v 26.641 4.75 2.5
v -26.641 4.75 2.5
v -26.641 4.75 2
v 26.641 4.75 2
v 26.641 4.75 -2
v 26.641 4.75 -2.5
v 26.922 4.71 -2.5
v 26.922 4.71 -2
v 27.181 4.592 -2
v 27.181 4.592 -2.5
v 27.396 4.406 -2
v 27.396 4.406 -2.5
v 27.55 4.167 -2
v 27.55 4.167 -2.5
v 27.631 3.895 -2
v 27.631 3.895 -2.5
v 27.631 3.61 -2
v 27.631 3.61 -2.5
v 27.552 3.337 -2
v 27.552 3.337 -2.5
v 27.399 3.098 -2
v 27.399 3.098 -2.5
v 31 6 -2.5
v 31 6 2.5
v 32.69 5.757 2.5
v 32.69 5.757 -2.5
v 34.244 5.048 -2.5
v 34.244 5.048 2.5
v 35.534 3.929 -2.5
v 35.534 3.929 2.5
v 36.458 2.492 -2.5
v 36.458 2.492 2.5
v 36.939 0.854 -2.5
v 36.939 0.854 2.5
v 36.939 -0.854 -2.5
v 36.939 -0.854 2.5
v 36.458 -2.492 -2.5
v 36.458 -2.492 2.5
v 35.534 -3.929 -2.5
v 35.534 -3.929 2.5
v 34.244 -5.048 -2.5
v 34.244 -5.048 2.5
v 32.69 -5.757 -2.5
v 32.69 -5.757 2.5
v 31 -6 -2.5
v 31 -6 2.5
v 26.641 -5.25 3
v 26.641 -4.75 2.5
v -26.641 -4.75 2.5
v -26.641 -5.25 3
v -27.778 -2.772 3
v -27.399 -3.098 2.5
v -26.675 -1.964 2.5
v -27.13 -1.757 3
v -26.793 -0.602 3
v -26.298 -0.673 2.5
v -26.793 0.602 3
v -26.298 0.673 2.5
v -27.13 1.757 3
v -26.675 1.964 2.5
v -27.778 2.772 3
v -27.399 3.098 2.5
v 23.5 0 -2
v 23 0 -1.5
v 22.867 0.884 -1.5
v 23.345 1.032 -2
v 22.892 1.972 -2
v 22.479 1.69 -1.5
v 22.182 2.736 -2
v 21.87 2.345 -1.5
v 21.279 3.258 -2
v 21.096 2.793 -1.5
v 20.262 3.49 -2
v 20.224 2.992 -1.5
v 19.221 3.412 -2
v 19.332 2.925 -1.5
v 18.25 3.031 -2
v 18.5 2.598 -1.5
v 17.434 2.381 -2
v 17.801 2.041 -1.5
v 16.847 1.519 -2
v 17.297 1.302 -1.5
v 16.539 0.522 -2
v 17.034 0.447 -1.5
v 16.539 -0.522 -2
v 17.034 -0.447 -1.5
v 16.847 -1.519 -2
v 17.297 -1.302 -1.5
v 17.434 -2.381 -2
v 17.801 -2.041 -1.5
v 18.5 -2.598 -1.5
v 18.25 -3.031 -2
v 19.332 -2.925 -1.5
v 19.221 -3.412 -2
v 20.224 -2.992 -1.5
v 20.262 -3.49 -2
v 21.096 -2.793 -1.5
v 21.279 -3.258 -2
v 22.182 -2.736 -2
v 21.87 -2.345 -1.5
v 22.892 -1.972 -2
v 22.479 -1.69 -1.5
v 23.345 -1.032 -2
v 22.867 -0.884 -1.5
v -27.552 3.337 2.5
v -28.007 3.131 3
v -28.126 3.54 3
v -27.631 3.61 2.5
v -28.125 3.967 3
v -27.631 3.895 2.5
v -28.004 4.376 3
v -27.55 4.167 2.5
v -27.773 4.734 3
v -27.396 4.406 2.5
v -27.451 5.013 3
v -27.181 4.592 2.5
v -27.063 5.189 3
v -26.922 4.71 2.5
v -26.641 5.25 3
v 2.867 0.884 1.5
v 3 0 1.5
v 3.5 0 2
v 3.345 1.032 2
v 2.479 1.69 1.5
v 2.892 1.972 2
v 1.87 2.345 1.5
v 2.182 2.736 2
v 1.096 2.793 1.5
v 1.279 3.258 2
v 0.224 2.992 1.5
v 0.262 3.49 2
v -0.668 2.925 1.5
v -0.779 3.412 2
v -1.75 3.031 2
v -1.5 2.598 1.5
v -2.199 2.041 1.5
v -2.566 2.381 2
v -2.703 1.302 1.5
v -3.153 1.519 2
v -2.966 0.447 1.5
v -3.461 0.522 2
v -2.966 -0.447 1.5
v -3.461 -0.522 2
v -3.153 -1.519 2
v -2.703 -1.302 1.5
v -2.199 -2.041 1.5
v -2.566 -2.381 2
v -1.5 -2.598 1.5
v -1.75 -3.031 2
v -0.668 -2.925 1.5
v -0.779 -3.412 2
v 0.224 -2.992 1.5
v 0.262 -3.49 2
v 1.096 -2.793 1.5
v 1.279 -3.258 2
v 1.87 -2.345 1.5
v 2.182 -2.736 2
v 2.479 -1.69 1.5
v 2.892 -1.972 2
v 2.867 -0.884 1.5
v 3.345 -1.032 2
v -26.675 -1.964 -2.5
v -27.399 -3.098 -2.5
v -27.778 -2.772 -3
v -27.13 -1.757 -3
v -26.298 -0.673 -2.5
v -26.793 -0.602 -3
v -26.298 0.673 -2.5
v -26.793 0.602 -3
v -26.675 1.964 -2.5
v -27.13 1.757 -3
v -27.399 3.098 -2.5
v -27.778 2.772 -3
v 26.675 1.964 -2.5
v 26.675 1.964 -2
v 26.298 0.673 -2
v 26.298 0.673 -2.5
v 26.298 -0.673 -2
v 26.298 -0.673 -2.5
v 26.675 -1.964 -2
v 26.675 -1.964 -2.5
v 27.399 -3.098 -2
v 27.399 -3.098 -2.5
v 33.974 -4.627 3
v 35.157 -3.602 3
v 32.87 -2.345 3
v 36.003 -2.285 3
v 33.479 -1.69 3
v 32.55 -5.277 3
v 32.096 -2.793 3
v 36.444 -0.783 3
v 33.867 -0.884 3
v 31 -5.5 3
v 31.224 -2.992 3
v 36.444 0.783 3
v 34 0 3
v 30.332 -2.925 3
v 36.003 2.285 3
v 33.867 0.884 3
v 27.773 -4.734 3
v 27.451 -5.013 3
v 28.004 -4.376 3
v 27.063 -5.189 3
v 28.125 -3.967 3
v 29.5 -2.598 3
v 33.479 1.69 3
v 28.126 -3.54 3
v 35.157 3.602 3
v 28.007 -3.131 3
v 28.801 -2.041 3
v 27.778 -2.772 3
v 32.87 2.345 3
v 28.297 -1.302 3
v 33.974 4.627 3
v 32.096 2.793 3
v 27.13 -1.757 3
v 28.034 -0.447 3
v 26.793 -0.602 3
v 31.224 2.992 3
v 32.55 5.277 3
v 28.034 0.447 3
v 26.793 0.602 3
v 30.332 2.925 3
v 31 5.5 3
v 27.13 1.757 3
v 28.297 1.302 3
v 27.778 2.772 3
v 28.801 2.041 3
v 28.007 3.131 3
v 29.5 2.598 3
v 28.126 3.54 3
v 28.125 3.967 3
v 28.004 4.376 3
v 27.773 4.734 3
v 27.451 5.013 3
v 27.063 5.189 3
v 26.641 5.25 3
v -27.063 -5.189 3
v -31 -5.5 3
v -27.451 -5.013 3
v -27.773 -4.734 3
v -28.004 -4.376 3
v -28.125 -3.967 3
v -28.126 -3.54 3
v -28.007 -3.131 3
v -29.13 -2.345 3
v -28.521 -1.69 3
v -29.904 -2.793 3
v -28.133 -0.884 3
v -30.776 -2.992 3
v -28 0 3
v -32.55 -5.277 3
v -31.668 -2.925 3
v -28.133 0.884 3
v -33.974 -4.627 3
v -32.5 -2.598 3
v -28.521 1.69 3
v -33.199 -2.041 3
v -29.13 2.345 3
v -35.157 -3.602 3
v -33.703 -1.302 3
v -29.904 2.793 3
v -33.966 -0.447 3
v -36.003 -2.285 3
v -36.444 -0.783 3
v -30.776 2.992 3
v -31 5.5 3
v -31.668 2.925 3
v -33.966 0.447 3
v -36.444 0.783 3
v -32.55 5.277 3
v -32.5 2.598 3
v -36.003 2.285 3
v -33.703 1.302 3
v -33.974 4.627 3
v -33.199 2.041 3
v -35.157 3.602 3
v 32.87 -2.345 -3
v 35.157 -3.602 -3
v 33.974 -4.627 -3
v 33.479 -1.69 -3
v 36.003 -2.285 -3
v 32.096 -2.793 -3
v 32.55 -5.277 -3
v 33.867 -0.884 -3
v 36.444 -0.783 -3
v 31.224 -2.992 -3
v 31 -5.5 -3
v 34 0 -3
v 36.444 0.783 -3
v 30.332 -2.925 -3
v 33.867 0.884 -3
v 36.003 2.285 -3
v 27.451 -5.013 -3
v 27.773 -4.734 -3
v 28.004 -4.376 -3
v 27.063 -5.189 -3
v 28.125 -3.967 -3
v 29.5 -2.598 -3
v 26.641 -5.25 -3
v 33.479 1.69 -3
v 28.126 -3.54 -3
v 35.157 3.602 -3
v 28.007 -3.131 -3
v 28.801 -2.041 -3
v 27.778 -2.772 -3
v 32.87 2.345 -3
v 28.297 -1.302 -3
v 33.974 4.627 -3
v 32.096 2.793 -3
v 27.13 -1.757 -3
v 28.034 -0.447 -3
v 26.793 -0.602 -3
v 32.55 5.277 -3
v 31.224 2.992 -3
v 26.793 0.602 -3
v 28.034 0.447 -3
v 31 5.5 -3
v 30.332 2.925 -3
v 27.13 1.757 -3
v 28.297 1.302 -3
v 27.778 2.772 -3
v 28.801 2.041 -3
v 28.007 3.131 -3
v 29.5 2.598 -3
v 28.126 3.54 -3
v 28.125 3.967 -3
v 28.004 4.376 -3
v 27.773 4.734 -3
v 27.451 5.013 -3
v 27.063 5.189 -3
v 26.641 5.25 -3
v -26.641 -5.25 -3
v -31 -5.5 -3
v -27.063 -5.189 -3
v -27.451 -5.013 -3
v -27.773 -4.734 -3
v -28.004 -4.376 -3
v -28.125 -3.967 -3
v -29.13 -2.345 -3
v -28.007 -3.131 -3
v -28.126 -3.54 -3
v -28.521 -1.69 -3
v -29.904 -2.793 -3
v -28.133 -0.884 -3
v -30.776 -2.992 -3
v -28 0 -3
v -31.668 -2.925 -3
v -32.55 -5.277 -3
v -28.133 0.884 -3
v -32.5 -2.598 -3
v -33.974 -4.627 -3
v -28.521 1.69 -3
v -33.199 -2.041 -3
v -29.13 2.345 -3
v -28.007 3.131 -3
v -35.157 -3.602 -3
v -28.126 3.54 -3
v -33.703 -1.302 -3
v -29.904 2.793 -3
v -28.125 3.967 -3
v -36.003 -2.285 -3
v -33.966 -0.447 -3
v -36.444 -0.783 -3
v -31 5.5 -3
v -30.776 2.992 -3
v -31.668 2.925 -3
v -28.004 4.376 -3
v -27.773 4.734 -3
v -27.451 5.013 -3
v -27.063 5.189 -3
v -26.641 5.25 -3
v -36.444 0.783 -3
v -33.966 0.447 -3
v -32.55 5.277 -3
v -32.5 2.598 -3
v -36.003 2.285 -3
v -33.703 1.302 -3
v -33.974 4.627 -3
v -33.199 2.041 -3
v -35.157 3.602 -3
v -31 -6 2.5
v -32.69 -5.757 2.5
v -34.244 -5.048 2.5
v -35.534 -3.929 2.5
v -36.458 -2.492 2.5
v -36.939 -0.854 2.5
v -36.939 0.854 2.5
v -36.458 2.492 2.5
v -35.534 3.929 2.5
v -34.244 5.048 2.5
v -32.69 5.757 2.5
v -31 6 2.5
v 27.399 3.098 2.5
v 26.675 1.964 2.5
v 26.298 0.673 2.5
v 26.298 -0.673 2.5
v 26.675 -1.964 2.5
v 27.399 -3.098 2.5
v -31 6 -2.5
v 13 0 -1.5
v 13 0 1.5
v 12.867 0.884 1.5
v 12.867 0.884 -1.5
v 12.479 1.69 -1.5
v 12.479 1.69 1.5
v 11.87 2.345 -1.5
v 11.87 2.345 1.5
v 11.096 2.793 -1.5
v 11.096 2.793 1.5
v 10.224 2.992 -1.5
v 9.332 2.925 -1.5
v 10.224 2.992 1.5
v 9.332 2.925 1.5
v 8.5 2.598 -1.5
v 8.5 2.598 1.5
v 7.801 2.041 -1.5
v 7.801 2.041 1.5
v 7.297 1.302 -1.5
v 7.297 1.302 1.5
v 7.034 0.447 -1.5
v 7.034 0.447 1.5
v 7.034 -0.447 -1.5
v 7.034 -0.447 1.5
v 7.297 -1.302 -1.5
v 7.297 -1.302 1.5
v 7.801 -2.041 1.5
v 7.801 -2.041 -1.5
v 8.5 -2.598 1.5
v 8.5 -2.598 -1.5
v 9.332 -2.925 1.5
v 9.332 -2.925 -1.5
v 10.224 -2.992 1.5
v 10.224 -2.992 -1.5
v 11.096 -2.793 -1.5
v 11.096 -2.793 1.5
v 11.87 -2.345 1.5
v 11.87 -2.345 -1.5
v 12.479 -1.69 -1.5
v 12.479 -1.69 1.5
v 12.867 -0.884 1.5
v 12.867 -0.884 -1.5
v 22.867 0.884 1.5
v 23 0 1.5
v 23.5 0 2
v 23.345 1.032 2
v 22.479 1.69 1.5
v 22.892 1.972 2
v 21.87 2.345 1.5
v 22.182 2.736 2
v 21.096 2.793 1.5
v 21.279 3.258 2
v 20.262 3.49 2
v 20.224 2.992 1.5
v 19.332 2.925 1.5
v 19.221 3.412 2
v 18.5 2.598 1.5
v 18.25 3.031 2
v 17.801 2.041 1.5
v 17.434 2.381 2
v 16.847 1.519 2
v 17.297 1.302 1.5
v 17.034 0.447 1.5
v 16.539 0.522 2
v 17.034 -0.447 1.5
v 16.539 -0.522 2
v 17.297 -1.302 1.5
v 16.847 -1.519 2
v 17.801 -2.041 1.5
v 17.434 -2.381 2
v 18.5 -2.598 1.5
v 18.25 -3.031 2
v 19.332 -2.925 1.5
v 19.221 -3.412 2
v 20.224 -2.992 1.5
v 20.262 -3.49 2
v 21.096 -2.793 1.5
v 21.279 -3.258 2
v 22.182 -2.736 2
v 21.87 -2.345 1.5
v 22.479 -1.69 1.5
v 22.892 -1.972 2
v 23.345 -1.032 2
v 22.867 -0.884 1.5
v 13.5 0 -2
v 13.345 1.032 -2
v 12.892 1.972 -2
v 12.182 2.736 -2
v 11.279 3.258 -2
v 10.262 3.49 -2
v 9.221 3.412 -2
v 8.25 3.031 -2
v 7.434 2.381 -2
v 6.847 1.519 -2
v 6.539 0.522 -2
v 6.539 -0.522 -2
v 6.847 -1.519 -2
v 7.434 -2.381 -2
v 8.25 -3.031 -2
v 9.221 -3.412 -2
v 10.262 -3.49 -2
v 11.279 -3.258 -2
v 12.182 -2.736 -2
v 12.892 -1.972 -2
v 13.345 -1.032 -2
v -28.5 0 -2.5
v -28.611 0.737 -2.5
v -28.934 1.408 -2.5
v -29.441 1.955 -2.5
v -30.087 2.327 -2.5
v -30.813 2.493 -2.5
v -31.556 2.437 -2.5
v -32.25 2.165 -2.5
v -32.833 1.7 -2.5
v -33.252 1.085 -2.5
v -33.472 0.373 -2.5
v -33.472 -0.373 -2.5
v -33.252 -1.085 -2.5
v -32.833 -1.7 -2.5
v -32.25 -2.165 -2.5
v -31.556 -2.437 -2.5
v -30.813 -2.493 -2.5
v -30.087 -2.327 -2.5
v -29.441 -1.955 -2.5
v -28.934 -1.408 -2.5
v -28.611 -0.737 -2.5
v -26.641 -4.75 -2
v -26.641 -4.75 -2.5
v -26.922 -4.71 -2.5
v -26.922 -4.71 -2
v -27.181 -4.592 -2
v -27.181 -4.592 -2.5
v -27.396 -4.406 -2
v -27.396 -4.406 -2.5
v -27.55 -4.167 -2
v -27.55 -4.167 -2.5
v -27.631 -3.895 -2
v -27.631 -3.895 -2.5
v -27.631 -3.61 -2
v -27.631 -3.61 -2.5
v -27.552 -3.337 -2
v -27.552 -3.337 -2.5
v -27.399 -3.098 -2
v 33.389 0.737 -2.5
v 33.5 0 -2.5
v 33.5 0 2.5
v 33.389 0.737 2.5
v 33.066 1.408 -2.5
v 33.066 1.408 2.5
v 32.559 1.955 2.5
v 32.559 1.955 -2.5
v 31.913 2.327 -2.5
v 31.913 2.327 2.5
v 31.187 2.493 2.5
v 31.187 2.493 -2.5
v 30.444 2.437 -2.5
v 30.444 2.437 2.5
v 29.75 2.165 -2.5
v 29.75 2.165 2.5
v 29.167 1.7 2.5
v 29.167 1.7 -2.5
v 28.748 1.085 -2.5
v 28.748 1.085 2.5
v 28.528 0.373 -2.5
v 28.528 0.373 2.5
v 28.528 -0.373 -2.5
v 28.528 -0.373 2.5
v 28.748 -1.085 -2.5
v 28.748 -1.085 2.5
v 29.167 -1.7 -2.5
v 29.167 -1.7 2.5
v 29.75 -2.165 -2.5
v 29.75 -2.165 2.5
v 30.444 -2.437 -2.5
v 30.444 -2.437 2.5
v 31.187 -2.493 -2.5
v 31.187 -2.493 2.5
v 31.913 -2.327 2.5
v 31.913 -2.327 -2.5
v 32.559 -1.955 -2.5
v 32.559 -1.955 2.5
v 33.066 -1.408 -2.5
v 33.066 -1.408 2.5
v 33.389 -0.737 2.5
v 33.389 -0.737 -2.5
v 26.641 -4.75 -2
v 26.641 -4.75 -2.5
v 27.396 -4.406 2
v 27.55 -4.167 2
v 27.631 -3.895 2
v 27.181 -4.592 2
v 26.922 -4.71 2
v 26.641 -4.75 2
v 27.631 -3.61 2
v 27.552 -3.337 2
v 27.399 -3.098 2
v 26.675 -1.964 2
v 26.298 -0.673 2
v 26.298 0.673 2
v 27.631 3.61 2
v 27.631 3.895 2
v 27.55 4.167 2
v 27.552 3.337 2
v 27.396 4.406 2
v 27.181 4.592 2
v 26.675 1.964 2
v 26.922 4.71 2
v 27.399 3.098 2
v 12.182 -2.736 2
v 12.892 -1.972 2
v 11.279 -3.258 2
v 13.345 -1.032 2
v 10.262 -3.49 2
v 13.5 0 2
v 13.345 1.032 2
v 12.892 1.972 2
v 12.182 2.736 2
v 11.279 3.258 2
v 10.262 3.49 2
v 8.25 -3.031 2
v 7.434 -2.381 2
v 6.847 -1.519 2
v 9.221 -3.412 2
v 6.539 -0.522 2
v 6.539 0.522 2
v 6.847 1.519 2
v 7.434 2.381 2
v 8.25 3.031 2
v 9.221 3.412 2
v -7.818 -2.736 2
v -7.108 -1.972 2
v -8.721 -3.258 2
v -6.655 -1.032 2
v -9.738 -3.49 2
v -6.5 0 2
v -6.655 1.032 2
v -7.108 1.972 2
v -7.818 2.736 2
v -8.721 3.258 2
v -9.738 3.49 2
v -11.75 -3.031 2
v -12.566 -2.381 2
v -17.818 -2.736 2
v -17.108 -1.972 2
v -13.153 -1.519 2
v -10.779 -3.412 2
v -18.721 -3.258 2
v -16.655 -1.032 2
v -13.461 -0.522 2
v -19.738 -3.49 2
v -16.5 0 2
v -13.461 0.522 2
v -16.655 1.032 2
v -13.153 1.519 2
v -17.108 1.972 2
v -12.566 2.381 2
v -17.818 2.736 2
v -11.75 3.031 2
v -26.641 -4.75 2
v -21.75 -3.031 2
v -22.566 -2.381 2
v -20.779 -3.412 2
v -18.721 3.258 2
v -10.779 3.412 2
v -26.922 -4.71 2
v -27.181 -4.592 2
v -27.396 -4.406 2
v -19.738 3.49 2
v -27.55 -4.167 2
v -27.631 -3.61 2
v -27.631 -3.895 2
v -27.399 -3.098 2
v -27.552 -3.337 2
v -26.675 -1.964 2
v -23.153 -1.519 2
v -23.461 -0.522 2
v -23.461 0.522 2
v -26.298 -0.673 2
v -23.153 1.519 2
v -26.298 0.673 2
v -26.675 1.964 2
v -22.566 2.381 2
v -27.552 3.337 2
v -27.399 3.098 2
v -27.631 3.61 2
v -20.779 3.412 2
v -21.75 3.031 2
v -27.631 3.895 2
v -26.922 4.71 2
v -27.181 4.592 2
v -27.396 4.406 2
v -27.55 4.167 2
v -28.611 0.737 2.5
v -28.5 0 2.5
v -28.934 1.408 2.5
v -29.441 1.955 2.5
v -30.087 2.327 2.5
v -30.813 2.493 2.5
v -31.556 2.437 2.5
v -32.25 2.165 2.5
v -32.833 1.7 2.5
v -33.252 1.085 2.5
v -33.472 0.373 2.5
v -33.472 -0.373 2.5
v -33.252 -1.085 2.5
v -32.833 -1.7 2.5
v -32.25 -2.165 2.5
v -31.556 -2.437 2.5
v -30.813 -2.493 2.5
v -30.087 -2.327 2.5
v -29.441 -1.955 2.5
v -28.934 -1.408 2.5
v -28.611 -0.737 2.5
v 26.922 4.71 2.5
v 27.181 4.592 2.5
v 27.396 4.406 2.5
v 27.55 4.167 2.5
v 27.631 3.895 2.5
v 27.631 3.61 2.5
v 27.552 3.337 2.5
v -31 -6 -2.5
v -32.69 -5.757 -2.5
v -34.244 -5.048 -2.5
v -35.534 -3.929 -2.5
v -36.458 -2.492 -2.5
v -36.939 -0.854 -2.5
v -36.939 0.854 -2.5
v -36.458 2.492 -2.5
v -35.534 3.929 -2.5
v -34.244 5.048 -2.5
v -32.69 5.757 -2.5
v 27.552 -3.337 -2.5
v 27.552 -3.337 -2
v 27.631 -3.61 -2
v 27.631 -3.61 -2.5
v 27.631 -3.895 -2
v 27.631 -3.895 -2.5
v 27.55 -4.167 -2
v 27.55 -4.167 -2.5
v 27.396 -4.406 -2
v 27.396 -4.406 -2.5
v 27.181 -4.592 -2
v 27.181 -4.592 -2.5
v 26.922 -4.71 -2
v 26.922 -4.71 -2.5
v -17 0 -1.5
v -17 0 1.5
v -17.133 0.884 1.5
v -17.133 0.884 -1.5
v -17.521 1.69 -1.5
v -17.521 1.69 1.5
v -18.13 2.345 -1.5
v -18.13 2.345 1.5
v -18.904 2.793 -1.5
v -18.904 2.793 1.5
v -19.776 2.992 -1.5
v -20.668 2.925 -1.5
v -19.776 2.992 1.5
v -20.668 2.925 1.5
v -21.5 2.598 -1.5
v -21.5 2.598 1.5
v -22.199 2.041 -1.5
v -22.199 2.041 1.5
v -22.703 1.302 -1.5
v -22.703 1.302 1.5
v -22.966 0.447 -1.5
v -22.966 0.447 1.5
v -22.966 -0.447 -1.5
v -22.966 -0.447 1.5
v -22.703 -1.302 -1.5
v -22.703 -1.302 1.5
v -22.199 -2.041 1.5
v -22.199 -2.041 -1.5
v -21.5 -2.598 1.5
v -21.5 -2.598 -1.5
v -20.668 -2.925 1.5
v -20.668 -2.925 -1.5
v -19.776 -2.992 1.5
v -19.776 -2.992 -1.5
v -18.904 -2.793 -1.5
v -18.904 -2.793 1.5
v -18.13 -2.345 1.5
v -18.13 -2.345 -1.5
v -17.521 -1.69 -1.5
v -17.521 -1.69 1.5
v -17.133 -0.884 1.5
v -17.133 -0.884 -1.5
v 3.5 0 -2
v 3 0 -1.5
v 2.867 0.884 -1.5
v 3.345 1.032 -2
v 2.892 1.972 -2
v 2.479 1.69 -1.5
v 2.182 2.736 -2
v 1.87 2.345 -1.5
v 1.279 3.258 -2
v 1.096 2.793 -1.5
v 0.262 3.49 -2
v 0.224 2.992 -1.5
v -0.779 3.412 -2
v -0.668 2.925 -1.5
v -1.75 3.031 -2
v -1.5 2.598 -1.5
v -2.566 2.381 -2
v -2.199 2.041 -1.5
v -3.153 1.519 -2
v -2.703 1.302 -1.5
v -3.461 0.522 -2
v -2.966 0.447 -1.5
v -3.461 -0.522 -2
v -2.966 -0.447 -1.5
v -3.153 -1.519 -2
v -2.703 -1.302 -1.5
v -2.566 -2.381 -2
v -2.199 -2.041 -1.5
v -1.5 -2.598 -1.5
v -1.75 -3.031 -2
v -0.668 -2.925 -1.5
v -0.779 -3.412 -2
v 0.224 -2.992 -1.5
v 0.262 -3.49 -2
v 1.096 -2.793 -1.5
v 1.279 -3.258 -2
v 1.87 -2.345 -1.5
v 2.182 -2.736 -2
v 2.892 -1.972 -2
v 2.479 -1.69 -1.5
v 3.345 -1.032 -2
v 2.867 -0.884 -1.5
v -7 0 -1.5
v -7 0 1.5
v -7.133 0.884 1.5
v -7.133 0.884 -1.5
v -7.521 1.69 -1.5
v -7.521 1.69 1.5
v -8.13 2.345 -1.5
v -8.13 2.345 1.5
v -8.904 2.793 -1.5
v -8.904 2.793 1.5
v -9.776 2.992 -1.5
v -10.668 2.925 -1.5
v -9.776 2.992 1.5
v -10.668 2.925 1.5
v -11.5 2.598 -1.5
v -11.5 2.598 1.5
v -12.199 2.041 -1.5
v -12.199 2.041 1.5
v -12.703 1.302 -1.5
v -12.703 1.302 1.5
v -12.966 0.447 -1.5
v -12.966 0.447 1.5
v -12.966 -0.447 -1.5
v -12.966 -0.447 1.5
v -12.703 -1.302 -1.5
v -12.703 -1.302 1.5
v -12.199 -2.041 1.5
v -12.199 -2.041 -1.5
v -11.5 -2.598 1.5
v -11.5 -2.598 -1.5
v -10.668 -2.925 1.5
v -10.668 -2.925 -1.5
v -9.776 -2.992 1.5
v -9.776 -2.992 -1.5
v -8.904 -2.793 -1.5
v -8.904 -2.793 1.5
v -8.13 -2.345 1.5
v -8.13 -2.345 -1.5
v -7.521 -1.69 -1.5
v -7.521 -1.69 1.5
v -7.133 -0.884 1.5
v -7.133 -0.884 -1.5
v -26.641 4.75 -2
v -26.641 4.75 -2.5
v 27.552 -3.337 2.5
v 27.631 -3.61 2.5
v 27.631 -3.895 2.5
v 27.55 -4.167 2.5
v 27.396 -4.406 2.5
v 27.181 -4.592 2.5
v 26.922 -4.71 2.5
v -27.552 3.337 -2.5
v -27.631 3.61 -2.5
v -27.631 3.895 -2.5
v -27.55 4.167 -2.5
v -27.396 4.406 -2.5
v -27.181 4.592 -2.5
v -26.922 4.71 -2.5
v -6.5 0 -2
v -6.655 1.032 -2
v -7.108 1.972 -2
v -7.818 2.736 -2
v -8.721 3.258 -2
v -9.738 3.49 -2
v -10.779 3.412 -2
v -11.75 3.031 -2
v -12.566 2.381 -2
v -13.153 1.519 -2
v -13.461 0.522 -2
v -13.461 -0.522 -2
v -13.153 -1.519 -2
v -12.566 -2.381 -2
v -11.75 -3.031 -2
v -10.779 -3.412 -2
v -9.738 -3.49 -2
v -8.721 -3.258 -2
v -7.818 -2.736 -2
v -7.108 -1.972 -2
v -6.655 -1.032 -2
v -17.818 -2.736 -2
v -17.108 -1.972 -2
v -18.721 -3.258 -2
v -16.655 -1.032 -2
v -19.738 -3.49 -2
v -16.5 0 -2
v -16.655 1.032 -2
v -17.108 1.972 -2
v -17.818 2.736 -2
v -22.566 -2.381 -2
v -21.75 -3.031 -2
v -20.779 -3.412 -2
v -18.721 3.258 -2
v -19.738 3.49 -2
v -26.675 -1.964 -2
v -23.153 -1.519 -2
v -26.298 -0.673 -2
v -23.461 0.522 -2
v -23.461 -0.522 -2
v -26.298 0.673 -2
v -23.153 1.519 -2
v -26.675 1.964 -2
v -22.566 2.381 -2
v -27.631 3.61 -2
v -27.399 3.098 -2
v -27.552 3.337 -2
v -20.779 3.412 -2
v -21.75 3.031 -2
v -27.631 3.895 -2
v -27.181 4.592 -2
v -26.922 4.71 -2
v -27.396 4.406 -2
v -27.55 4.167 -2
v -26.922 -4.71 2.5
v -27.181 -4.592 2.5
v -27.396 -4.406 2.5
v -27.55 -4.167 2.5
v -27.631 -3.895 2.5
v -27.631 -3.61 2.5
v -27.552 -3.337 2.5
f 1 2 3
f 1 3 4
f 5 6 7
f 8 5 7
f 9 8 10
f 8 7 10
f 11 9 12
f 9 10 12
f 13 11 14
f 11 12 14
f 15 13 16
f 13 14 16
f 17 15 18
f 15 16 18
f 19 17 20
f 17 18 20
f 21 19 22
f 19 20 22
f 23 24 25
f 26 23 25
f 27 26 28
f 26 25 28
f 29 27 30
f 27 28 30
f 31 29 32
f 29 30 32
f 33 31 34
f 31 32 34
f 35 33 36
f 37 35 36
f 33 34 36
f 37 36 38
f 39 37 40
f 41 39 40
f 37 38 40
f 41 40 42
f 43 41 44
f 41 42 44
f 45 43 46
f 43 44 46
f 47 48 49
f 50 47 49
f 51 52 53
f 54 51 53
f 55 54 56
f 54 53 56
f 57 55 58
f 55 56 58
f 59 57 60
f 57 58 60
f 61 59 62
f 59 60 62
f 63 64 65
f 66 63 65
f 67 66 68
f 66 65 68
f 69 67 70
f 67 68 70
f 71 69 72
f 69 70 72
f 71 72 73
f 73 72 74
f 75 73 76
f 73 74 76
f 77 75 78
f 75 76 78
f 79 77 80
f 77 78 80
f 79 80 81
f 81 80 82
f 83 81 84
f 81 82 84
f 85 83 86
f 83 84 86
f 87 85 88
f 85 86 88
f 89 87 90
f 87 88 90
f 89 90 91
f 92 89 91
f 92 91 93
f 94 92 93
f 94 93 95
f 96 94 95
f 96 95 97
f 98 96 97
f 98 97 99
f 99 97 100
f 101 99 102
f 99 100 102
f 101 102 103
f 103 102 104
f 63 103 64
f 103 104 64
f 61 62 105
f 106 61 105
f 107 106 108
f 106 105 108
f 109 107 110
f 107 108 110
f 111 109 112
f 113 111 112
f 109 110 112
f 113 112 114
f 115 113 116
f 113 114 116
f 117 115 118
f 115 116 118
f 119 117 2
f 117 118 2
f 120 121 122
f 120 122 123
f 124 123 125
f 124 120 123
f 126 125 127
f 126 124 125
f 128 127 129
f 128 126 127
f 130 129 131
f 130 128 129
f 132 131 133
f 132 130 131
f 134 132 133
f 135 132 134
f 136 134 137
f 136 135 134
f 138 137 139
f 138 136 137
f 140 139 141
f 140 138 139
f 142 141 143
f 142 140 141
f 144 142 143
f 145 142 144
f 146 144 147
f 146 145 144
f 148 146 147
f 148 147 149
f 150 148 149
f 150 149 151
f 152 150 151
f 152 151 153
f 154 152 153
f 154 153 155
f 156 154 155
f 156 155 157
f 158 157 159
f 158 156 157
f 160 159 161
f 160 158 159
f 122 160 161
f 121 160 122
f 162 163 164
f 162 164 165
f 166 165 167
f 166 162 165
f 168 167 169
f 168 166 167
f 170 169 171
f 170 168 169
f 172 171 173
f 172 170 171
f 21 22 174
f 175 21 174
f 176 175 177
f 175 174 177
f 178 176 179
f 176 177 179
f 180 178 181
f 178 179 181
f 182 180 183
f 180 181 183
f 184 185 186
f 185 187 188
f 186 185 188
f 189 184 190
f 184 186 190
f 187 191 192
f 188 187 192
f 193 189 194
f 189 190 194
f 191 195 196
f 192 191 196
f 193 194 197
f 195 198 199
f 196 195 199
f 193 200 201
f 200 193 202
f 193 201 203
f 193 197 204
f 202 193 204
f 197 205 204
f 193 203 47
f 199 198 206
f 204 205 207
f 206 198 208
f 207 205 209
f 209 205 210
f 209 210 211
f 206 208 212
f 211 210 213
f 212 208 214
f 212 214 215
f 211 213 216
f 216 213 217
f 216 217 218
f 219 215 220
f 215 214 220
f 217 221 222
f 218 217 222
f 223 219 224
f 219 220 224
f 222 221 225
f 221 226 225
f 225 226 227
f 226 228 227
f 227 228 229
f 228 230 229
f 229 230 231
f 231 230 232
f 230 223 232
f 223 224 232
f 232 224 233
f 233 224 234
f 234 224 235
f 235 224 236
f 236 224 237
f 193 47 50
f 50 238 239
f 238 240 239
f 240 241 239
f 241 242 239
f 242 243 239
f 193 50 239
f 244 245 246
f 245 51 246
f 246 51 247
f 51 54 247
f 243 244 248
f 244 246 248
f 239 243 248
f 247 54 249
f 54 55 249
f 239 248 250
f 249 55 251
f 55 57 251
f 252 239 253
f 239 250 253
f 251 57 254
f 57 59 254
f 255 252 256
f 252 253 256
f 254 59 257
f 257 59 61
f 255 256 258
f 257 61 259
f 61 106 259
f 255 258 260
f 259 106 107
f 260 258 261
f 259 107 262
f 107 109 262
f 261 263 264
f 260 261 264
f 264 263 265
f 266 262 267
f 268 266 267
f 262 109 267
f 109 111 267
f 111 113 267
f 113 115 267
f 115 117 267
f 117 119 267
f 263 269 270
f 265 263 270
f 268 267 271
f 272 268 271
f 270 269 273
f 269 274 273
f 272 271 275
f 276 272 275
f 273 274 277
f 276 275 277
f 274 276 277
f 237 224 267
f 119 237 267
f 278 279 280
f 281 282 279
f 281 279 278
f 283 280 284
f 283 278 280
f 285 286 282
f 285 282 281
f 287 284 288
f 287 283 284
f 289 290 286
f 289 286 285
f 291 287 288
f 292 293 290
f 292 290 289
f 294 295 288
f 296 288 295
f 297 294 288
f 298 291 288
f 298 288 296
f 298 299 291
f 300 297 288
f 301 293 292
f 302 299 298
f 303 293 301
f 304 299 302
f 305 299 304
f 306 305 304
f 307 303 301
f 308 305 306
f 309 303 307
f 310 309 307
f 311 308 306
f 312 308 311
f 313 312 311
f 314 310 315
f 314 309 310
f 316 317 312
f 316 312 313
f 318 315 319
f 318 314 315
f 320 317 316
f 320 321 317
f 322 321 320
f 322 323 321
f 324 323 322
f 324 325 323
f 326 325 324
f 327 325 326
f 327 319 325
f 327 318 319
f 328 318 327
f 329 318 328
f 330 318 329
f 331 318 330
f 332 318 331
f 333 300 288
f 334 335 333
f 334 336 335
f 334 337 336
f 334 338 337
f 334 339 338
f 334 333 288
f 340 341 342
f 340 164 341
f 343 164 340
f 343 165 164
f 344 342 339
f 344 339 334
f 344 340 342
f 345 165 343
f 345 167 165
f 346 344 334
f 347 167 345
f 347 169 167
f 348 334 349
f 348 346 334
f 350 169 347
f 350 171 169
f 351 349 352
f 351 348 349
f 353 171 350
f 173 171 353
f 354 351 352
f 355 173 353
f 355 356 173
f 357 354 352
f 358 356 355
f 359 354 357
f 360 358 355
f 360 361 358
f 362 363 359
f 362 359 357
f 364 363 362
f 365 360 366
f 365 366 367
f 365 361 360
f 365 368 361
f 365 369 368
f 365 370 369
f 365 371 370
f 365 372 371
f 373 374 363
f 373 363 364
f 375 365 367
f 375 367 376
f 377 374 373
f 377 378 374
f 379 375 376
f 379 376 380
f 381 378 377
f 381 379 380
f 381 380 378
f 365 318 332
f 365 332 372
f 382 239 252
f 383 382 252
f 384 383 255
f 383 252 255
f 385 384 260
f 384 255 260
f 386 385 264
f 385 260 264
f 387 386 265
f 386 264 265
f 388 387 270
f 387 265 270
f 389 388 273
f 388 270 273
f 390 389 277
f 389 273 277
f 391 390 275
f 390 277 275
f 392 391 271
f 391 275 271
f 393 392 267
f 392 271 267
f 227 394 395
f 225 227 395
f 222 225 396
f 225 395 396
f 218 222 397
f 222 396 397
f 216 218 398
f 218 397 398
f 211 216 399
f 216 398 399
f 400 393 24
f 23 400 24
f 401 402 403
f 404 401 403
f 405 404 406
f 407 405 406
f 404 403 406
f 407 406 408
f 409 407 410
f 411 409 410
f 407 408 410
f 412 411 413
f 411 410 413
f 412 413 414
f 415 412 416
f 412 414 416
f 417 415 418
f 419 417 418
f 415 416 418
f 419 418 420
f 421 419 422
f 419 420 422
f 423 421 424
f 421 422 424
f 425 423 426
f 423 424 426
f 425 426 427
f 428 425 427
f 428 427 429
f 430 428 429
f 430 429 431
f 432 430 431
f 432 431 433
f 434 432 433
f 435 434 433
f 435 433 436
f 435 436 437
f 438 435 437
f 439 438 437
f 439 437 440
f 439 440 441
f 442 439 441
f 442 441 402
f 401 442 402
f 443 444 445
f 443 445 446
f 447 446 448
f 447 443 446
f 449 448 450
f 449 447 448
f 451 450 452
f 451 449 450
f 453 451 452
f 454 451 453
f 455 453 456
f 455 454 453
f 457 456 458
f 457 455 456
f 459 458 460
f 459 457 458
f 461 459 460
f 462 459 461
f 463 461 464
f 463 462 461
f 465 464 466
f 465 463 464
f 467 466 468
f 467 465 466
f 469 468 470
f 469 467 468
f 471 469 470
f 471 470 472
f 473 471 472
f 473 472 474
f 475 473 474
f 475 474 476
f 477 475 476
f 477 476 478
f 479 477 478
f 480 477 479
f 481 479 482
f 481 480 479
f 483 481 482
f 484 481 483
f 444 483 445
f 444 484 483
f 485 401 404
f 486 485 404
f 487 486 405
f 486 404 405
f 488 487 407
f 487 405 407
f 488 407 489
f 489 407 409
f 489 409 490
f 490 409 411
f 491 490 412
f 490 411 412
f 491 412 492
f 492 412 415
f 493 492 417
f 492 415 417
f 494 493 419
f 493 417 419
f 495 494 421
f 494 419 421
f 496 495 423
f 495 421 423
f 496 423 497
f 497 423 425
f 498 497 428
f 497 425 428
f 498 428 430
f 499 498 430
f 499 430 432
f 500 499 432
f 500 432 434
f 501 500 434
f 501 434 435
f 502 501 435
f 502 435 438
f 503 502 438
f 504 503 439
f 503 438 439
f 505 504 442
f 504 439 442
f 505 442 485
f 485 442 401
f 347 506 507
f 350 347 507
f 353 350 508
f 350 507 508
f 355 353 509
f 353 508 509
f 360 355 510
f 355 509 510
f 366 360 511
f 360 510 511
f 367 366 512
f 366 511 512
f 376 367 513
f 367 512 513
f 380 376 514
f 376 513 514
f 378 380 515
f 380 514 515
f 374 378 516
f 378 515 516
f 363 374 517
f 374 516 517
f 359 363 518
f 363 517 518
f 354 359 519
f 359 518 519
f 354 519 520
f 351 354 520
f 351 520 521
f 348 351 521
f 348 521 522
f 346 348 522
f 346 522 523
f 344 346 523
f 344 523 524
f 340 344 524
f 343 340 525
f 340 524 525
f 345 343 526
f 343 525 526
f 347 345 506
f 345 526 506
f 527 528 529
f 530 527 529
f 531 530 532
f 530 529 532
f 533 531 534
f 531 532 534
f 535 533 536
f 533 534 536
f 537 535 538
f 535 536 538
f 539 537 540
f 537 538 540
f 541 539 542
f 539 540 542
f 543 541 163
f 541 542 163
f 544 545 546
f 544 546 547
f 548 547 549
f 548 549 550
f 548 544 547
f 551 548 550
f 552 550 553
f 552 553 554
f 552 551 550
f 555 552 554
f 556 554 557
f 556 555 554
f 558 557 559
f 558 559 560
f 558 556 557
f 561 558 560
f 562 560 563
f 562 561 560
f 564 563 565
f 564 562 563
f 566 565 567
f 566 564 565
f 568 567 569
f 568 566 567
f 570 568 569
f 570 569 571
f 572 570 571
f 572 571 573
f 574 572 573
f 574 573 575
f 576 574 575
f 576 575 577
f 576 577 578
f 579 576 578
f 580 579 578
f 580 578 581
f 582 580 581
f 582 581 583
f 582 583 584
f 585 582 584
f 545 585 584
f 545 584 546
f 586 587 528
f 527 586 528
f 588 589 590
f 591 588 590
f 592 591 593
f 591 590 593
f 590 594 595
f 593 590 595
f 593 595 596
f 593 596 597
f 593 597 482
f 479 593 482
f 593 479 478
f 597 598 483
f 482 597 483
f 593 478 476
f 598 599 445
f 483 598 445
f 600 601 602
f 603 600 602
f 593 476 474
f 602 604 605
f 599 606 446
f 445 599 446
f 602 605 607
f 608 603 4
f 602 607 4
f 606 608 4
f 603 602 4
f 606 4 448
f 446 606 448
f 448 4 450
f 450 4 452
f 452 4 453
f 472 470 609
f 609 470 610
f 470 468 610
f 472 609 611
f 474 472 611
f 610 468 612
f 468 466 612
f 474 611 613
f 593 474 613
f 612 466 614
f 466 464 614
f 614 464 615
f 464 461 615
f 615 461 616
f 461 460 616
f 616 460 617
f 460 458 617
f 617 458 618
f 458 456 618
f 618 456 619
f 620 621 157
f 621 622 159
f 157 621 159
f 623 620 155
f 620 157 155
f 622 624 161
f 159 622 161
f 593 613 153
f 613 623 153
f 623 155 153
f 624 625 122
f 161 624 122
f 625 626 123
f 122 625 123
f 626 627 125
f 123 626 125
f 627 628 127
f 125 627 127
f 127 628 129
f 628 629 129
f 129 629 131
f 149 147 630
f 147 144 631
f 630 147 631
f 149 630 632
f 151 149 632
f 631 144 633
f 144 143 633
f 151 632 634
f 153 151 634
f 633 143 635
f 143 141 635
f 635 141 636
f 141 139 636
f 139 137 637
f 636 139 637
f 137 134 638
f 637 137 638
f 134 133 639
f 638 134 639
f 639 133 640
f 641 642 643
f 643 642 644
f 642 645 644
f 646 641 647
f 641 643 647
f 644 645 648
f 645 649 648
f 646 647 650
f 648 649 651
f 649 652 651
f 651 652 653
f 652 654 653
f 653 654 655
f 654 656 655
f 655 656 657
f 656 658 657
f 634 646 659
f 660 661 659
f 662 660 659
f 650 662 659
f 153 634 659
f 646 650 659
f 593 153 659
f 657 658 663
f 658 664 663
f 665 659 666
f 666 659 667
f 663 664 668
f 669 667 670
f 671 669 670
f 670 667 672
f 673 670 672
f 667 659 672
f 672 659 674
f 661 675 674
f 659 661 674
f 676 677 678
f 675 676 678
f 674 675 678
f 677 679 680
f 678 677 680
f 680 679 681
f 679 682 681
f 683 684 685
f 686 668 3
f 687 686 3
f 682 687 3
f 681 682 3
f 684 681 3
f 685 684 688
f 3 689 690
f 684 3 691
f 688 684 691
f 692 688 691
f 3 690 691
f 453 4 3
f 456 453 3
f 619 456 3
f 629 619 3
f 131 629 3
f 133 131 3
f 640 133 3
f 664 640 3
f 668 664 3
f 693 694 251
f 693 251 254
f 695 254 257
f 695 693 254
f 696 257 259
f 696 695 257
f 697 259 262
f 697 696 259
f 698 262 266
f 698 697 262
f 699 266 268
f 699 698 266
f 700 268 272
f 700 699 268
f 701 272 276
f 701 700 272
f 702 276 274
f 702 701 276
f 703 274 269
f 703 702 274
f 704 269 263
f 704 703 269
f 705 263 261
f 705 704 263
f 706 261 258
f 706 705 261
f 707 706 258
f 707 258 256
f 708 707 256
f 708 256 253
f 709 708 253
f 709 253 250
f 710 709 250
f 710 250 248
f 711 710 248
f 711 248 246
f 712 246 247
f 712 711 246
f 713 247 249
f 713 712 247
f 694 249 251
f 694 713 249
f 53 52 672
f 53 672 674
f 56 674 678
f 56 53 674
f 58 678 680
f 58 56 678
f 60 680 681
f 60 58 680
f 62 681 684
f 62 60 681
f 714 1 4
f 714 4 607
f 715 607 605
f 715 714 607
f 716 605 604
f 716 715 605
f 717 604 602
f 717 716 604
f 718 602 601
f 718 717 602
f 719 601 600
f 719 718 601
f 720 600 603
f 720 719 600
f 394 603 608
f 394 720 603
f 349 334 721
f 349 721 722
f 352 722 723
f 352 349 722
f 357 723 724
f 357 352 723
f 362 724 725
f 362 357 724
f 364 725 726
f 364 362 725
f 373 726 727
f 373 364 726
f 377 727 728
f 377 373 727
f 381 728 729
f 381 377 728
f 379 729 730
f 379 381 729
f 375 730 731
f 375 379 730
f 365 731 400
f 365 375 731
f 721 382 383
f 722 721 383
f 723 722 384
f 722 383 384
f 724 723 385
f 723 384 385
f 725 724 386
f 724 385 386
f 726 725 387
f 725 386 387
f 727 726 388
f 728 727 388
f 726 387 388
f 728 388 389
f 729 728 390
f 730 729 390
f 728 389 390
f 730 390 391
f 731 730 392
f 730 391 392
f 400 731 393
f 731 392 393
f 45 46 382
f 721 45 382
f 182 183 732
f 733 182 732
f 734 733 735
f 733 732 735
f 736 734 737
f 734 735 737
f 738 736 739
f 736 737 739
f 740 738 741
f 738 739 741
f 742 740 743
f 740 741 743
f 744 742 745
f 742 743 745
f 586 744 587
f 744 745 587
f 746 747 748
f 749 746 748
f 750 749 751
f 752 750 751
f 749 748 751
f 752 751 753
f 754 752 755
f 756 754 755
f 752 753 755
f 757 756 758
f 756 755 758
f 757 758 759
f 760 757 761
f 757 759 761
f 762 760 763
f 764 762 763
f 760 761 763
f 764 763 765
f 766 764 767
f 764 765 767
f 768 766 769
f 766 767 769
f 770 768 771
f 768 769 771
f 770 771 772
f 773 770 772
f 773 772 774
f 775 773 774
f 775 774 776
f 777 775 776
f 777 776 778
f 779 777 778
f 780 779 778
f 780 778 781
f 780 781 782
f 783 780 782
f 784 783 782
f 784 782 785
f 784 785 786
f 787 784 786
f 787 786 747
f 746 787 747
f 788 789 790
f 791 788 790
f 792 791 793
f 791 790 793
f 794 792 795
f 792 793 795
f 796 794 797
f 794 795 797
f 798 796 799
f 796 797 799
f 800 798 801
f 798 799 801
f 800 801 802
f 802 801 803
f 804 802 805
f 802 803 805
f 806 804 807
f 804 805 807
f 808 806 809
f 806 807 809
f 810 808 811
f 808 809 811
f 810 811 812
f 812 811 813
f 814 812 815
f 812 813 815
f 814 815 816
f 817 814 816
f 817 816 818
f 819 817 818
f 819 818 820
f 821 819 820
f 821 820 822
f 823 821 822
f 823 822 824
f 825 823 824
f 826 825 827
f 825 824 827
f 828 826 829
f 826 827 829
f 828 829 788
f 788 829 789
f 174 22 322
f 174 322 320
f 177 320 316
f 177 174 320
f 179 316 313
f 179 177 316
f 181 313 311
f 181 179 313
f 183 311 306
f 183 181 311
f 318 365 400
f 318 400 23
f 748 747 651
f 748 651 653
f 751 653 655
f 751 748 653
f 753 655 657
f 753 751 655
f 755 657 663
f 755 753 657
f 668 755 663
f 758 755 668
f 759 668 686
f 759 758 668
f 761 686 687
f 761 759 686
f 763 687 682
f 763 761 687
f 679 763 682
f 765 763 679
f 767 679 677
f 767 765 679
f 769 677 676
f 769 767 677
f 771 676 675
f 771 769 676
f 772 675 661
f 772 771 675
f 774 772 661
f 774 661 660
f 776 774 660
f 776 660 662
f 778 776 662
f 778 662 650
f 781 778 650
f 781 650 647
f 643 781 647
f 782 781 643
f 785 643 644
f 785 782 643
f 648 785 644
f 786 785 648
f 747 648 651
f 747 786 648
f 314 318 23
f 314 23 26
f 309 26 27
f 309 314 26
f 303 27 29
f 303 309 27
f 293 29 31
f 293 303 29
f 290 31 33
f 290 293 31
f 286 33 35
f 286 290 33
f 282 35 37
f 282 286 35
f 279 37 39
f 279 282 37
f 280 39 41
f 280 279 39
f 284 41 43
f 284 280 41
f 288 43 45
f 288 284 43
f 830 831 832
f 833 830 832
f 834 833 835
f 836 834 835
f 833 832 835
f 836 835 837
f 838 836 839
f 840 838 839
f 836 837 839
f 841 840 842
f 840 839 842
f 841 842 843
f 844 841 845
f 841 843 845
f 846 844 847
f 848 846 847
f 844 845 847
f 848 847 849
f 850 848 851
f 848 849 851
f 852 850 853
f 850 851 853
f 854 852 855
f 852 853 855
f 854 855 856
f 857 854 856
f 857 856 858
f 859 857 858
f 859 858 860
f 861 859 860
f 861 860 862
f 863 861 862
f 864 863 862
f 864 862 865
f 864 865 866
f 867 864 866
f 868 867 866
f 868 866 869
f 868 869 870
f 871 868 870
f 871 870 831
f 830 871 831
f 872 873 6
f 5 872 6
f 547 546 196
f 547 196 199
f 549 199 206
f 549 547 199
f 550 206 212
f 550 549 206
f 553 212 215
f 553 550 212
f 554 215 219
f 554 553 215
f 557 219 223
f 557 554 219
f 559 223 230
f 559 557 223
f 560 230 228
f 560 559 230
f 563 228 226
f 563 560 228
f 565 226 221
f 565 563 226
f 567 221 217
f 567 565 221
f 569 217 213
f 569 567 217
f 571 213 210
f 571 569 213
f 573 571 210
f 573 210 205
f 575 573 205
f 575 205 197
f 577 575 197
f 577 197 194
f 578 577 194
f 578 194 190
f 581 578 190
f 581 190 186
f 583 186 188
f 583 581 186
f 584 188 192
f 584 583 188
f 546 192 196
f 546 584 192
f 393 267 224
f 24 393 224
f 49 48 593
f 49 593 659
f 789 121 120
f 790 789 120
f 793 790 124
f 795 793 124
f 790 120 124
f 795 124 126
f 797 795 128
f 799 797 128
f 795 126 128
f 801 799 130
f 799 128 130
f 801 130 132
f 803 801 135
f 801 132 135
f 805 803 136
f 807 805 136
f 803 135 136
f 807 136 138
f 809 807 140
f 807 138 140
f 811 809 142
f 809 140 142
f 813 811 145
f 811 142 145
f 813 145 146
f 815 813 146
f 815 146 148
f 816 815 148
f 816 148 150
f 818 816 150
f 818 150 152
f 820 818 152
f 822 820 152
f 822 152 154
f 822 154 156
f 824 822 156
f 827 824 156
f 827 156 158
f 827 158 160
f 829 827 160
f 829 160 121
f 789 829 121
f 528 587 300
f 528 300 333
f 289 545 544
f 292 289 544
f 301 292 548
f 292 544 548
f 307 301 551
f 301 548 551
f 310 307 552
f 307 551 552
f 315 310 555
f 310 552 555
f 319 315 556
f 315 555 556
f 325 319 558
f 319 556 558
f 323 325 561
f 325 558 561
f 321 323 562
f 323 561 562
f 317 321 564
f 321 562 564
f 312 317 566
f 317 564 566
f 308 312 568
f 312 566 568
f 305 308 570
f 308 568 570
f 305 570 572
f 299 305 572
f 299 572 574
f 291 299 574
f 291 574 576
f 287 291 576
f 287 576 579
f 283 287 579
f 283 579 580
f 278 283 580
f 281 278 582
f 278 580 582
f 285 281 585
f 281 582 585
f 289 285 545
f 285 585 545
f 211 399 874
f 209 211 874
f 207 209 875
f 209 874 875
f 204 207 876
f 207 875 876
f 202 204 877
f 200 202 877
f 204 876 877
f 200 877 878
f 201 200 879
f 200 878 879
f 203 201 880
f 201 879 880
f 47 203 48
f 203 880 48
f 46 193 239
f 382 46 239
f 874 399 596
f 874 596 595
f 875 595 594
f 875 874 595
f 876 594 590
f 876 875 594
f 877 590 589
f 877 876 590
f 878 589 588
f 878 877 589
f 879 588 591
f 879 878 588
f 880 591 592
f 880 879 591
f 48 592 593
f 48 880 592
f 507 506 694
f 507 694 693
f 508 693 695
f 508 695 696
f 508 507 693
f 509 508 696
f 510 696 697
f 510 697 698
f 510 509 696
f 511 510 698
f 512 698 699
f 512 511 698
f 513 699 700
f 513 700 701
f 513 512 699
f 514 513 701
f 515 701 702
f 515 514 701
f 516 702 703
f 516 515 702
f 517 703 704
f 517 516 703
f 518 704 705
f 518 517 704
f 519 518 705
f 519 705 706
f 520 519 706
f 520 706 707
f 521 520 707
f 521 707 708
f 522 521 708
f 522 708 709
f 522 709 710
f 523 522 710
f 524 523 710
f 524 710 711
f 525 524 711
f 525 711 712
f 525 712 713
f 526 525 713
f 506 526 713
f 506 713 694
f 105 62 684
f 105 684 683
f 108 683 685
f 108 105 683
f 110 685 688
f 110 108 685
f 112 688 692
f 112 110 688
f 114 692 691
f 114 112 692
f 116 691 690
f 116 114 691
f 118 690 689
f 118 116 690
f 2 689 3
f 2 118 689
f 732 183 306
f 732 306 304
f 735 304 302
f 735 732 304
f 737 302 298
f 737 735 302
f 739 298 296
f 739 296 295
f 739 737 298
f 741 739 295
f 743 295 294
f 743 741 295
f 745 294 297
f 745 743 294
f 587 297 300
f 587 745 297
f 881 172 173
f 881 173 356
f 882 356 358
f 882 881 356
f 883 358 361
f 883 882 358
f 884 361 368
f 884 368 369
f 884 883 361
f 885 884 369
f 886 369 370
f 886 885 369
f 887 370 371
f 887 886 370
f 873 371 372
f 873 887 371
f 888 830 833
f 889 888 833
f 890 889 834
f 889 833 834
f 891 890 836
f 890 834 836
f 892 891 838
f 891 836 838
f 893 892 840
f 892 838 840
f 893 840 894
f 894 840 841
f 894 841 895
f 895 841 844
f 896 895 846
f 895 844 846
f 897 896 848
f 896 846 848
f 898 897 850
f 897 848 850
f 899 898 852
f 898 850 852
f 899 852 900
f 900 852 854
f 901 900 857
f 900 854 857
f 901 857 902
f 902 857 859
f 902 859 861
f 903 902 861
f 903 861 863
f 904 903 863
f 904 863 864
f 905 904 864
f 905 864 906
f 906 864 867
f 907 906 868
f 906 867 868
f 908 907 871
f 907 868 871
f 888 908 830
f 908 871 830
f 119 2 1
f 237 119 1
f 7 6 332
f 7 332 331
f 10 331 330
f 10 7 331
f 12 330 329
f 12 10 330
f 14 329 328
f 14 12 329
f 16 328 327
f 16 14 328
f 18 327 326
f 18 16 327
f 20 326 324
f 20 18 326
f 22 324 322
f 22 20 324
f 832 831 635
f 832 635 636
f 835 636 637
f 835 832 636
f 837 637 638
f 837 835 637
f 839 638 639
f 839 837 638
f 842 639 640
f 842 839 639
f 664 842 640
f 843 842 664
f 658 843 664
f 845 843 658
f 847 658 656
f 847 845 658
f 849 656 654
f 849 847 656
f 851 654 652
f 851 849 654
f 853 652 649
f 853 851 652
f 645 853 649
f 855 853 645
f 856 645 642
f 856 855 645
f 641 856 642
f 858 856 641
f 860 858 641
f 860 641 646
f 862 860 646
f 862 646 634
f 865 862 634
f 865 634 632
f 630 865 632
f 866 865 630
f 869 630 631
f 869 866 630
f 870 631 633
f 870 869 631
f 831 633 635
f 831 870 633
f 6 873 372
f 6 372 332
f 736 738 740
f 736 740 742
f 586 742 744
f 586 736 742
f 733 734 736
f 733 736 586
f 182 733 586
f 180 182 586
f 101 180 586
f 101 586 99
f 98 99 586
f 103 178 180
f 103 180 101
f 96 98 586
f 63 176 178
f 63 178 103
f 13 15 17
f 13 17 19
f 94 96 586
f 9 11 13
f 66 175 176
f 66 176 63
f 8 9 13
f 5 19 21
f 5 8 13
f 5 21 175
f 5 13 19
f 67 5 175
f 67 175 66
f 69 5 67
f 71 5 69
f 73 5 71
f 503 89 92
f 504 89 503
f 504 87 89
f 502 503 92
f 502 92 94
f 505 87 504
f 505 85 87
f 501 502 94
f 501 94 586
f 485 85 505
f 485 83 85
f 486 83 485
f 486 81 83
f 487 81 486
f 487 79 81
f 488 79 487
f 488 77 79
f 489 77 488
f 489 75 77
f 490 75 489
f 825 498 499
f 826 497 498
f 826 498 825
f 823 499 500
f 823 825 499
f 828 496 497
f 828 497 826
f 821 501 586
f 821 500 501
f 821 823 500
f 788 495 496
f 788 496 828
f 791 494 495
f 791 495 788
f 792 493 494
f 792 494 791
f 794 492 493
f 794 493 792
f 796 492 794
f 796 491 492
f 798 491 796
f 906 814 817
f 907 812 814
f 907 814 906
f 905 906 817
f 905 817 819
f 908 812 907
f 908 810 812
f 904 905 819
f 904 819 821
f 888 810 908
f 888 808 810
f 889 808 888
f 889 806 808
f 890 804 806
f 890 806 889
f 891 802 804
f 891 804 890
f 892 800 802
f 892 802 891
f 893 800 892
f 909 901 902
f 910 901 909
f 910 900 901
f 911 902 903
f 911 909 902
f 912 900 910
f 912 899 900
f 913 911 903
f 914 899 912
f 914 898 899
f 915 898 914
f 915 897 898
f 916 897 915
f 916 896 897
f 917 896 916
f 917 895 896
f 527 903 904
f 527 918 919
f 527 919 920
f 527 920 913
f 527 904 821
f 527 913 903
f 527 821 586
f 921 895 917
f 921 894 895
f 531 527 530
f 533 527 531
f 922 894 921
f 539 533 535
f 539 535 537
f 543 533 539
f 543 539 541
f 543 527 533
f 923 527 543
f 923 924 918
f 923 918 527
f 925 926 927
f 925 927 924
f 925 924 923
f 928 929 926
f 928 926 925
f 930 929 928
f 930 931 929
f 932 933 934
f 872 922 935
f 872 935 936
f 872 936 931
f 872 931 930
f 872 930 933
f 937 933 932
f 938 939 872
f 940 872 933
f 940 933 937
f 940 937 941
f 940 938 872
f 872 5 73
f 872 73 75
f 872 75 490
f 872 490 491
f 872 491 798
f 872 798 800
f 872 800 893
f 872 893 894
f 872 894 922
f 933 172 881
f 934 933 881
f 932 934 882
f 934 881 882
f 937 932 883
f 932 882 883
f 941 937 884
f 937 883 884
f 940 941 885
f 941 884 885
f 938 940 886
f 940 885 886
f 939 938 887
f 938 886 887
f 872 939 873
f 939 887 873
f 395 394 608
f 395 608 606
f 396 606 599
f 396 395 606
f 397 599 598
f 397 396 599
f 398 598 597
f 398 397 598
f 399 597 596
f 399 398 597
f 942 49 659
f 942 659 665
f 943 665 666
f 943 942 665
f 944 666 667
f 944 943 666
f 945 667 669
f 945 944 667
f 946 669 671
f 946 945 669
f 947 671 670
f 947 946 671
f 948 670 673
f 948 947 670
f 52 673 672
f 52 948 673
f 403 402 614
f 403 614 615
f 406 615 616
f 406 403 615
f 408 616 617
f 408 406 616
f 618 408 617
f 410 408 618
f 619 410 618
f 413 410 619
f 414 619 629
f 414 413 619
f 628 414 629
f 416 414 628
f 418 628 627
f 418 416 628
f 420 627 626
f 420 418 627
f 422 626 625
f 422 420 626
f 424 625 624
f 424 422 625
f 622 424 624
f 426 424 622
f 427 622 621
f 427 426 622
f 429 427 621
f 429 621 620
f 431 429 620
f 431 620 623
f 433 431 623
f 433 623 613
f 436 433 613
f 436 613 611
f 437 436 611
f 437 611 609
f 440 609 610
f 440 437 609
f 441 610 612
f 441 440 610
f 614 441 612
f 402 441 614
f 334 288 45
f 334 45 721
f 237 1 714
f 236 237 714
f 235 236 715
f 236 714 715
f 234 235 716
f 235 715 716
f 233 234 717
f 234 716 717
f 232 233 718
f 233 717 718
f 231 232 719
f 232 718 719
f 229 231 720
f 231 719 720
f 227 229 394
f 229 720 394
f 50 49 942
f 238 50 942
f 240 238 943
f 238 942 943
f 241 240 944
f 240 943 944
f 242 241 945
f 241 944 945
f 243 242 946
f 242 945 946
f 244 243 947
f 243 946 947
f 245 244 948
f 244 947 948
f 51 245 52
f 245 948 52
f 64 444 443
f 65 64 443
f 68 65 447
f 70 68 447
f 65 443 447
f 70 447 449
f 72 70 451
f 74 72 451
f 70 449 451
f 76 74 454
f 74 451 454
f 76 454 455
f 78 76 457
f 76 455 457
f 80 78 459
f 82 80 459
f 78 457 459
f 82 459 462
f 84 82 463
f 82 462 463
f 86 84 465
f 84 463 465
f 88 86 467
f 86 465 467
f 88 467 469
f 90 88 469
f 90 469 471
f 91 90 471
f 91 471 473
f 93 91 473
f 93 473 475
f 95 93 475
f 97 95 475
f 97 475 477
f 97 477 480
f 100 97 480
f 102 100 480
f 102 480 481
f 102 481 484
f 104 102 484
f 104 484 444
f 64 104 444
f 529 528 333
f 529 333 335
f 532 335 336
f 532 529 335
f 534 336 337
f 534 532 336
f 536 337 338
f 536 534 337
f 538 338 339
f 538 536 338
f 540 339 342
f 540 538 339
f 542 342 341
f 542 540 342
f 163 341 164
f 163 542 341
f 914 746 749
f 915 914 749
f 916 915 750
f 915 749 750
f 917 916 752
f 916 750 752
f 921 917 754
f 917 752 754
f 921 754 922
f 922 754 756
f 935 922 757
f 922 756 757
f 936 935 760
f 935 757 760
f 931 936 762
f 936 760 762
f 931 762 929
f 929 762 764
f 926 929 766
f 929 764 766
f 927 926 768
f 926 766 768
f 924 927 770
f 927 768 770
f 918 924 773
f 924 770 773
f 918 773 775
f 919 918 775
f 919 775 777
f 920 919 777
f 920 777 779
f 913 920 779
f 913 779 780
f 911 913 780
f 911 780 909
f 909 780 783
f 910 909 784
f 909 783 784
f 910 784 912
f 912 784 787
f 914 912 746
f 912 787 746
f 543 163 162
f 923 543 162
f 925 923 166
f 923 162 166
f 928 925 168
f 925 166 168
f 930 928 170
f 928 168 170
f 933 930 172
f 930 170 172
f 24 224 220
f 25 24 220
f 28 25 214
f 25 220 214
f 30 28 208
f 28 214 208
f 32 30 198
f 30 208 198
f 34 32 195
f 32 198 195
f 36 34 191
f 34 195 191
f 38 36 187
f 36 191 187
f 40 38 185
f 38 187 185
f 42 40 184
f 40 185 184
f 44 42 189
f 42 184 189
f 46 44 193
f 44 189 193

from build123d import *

# Parameters (mm, degrees)
SKETCH1_R           = 2.5
BOSS_EXTRUDE1_DEPTH = 3
CUT_EXTRUDE1_DEPTH  = 1
SKETCH3_R           = 3
CUT_EXTRUDE2_DEPTH  = 38.815340802
CHAMFER1_SIZE       = 0.5
CHAMFER2_SIZE       = 0.5


with BuildPart() as part:
    # Sketch1 → Boss-Extrude1 (new, symmetric)
    with BuildSketch(Plane.XY):
        with BuildLine():
            Line((-31, 6), (31, 6))
            ThreePointArc((31, 6), (37, 0), (31, -6))
            Line((31, -6), (-31, -6))
            ThreePointArc((-31, -6), (-37, 0), (-31, 6))
        make_face()
        with Locations((-31, 0)):
            Circle(SKETCH1_R, mode=Mode.SUBTRACT)
        with Locations((31, 0)):
            Circle(SKETCH1_R, mode=Mode.SUBTRACT)
    extrude(amount=BOSS_EXTRUDE1_DEPTH, both=True)

    # Sketch2 → Cut-Extrude1 (cut)
    with BuildSketch(Plane.XY.offset(3)):
        with BuildLine():
            Line((-26.641101056, 4.75), (26.641101056, 4.75))
            ThreePointArc((26.641101056, 4.75), (27.549994316, 4.167028828), (27.399170438, 3.097826087))
            ThreePointArc((27.399170438, 3.097826087), (26.25, 0), (27.399170438, -3.097826087))
            ThreePointArc((27.399170438, -3.097826087), (27.549994316, -4.167028828), (26.641101056, -4.75))
            Line((26.641101056, -4.75), (-26.641101056, -4.75))
            ThreePointArc((-26.641101056, -4.75), (-27.549994316, -4.167028828), (-27.399170438, -3.097826087))
            ThreePointArc((-27.399170438, -3.097826087), (-26.25, 0), (-27.399170438, 3.097826087))
            ThreePointArc((-27.399170438, 3.097826087), (-27.549994316, 4.167028828), (-26.641101056, 4.75))
        make_face()
    cut_extrude1 = extrude(amount=-CUT_EXTRUDE1_DEPTH, mode=Mode.SUBTRACT)

    # Mirror1: Cut-Extrude1 across plane
    add(cut_extrude1.mirror(Plane.XY), mode=Mode.SUBTRACT)

    # Sketch3 → Cut-Extrude2 (cut, through all)
    with BuildSketch(Plane.XY.offset(2)):
        Circle(SKETCH3_R)
        with Locations((-20, 0)):
            Circle(SKETCH3_R)
        with Locations((-10, 0)):
            Circle(SKETCH3_R)
        with Locations((10, 0)):
            Circle(SKETCH3_R)
        with Locations((20, 0)):
            Circle(SKETCH3_R)
    extrude(amount=-CUT_EXTRUDE2_DEPTH, mode=Mode.SUBTRACT)

    # Chamfer1
    chamfer1_edges = [part.edges().sort_by_distance(p)[0] for p in [
        (-33.5, 0, 3),
        (37, 0, 3),
        (28.5, 0, 3),
        (0, 6, 3),
        (27.549994316, -4.167028828, 3),
        (26.25, 0, 3),
        (27.549994316, 4.167028828, 3),
        (0, 4.75, 3),
        (-27.549994316, 4.167028828, 3),
        (-26.25, 0, 3),
        (-27.549994316, -4.167028828, 3),
        (0, -4.75, 3),
        (-37, 0, 3),
        (17, 0, 2),
        (7, 0, 2),
        (-13, 0, 2),
        (-23, 0, 2),
        (-3, 0, 2),
        (0, -6, 3),
    ]]
    chamfer(chamfer1_edges, length=CHAMFER1_SIZE)

    # Chamfer2
    chamfer2_edges = [part.edges().sort_by_distance(p)[0] for p in [
        (-33.5, 0, -3),
        (28.5, 0, -3),
        (27.549994316, -4.167028828, -3),
        (26.25, 0, -3),
        (0, 6, -3),
        (27.549994316, 4.167028828, -3),
        (0, 4.75, -3),
        (-27.549994316, 4.167028828, -3),
        (-26.25, 0, -3),
        (-27.549994316, -4.167028828, -3),
        (0, -4.75, -3),
        (37, 0, -3),
        (0, -6, -3),
        (-37, 0, -3),
        (17, 0, -2),
        (7, 0, -2),
        (-13, 0, -2),
        (-23, 0, -2),
        (-3, 0, -2),
    ]]
    chamfer(chamfer2_edges, length=CHAMFER2_SIZE)


solid = part.part
